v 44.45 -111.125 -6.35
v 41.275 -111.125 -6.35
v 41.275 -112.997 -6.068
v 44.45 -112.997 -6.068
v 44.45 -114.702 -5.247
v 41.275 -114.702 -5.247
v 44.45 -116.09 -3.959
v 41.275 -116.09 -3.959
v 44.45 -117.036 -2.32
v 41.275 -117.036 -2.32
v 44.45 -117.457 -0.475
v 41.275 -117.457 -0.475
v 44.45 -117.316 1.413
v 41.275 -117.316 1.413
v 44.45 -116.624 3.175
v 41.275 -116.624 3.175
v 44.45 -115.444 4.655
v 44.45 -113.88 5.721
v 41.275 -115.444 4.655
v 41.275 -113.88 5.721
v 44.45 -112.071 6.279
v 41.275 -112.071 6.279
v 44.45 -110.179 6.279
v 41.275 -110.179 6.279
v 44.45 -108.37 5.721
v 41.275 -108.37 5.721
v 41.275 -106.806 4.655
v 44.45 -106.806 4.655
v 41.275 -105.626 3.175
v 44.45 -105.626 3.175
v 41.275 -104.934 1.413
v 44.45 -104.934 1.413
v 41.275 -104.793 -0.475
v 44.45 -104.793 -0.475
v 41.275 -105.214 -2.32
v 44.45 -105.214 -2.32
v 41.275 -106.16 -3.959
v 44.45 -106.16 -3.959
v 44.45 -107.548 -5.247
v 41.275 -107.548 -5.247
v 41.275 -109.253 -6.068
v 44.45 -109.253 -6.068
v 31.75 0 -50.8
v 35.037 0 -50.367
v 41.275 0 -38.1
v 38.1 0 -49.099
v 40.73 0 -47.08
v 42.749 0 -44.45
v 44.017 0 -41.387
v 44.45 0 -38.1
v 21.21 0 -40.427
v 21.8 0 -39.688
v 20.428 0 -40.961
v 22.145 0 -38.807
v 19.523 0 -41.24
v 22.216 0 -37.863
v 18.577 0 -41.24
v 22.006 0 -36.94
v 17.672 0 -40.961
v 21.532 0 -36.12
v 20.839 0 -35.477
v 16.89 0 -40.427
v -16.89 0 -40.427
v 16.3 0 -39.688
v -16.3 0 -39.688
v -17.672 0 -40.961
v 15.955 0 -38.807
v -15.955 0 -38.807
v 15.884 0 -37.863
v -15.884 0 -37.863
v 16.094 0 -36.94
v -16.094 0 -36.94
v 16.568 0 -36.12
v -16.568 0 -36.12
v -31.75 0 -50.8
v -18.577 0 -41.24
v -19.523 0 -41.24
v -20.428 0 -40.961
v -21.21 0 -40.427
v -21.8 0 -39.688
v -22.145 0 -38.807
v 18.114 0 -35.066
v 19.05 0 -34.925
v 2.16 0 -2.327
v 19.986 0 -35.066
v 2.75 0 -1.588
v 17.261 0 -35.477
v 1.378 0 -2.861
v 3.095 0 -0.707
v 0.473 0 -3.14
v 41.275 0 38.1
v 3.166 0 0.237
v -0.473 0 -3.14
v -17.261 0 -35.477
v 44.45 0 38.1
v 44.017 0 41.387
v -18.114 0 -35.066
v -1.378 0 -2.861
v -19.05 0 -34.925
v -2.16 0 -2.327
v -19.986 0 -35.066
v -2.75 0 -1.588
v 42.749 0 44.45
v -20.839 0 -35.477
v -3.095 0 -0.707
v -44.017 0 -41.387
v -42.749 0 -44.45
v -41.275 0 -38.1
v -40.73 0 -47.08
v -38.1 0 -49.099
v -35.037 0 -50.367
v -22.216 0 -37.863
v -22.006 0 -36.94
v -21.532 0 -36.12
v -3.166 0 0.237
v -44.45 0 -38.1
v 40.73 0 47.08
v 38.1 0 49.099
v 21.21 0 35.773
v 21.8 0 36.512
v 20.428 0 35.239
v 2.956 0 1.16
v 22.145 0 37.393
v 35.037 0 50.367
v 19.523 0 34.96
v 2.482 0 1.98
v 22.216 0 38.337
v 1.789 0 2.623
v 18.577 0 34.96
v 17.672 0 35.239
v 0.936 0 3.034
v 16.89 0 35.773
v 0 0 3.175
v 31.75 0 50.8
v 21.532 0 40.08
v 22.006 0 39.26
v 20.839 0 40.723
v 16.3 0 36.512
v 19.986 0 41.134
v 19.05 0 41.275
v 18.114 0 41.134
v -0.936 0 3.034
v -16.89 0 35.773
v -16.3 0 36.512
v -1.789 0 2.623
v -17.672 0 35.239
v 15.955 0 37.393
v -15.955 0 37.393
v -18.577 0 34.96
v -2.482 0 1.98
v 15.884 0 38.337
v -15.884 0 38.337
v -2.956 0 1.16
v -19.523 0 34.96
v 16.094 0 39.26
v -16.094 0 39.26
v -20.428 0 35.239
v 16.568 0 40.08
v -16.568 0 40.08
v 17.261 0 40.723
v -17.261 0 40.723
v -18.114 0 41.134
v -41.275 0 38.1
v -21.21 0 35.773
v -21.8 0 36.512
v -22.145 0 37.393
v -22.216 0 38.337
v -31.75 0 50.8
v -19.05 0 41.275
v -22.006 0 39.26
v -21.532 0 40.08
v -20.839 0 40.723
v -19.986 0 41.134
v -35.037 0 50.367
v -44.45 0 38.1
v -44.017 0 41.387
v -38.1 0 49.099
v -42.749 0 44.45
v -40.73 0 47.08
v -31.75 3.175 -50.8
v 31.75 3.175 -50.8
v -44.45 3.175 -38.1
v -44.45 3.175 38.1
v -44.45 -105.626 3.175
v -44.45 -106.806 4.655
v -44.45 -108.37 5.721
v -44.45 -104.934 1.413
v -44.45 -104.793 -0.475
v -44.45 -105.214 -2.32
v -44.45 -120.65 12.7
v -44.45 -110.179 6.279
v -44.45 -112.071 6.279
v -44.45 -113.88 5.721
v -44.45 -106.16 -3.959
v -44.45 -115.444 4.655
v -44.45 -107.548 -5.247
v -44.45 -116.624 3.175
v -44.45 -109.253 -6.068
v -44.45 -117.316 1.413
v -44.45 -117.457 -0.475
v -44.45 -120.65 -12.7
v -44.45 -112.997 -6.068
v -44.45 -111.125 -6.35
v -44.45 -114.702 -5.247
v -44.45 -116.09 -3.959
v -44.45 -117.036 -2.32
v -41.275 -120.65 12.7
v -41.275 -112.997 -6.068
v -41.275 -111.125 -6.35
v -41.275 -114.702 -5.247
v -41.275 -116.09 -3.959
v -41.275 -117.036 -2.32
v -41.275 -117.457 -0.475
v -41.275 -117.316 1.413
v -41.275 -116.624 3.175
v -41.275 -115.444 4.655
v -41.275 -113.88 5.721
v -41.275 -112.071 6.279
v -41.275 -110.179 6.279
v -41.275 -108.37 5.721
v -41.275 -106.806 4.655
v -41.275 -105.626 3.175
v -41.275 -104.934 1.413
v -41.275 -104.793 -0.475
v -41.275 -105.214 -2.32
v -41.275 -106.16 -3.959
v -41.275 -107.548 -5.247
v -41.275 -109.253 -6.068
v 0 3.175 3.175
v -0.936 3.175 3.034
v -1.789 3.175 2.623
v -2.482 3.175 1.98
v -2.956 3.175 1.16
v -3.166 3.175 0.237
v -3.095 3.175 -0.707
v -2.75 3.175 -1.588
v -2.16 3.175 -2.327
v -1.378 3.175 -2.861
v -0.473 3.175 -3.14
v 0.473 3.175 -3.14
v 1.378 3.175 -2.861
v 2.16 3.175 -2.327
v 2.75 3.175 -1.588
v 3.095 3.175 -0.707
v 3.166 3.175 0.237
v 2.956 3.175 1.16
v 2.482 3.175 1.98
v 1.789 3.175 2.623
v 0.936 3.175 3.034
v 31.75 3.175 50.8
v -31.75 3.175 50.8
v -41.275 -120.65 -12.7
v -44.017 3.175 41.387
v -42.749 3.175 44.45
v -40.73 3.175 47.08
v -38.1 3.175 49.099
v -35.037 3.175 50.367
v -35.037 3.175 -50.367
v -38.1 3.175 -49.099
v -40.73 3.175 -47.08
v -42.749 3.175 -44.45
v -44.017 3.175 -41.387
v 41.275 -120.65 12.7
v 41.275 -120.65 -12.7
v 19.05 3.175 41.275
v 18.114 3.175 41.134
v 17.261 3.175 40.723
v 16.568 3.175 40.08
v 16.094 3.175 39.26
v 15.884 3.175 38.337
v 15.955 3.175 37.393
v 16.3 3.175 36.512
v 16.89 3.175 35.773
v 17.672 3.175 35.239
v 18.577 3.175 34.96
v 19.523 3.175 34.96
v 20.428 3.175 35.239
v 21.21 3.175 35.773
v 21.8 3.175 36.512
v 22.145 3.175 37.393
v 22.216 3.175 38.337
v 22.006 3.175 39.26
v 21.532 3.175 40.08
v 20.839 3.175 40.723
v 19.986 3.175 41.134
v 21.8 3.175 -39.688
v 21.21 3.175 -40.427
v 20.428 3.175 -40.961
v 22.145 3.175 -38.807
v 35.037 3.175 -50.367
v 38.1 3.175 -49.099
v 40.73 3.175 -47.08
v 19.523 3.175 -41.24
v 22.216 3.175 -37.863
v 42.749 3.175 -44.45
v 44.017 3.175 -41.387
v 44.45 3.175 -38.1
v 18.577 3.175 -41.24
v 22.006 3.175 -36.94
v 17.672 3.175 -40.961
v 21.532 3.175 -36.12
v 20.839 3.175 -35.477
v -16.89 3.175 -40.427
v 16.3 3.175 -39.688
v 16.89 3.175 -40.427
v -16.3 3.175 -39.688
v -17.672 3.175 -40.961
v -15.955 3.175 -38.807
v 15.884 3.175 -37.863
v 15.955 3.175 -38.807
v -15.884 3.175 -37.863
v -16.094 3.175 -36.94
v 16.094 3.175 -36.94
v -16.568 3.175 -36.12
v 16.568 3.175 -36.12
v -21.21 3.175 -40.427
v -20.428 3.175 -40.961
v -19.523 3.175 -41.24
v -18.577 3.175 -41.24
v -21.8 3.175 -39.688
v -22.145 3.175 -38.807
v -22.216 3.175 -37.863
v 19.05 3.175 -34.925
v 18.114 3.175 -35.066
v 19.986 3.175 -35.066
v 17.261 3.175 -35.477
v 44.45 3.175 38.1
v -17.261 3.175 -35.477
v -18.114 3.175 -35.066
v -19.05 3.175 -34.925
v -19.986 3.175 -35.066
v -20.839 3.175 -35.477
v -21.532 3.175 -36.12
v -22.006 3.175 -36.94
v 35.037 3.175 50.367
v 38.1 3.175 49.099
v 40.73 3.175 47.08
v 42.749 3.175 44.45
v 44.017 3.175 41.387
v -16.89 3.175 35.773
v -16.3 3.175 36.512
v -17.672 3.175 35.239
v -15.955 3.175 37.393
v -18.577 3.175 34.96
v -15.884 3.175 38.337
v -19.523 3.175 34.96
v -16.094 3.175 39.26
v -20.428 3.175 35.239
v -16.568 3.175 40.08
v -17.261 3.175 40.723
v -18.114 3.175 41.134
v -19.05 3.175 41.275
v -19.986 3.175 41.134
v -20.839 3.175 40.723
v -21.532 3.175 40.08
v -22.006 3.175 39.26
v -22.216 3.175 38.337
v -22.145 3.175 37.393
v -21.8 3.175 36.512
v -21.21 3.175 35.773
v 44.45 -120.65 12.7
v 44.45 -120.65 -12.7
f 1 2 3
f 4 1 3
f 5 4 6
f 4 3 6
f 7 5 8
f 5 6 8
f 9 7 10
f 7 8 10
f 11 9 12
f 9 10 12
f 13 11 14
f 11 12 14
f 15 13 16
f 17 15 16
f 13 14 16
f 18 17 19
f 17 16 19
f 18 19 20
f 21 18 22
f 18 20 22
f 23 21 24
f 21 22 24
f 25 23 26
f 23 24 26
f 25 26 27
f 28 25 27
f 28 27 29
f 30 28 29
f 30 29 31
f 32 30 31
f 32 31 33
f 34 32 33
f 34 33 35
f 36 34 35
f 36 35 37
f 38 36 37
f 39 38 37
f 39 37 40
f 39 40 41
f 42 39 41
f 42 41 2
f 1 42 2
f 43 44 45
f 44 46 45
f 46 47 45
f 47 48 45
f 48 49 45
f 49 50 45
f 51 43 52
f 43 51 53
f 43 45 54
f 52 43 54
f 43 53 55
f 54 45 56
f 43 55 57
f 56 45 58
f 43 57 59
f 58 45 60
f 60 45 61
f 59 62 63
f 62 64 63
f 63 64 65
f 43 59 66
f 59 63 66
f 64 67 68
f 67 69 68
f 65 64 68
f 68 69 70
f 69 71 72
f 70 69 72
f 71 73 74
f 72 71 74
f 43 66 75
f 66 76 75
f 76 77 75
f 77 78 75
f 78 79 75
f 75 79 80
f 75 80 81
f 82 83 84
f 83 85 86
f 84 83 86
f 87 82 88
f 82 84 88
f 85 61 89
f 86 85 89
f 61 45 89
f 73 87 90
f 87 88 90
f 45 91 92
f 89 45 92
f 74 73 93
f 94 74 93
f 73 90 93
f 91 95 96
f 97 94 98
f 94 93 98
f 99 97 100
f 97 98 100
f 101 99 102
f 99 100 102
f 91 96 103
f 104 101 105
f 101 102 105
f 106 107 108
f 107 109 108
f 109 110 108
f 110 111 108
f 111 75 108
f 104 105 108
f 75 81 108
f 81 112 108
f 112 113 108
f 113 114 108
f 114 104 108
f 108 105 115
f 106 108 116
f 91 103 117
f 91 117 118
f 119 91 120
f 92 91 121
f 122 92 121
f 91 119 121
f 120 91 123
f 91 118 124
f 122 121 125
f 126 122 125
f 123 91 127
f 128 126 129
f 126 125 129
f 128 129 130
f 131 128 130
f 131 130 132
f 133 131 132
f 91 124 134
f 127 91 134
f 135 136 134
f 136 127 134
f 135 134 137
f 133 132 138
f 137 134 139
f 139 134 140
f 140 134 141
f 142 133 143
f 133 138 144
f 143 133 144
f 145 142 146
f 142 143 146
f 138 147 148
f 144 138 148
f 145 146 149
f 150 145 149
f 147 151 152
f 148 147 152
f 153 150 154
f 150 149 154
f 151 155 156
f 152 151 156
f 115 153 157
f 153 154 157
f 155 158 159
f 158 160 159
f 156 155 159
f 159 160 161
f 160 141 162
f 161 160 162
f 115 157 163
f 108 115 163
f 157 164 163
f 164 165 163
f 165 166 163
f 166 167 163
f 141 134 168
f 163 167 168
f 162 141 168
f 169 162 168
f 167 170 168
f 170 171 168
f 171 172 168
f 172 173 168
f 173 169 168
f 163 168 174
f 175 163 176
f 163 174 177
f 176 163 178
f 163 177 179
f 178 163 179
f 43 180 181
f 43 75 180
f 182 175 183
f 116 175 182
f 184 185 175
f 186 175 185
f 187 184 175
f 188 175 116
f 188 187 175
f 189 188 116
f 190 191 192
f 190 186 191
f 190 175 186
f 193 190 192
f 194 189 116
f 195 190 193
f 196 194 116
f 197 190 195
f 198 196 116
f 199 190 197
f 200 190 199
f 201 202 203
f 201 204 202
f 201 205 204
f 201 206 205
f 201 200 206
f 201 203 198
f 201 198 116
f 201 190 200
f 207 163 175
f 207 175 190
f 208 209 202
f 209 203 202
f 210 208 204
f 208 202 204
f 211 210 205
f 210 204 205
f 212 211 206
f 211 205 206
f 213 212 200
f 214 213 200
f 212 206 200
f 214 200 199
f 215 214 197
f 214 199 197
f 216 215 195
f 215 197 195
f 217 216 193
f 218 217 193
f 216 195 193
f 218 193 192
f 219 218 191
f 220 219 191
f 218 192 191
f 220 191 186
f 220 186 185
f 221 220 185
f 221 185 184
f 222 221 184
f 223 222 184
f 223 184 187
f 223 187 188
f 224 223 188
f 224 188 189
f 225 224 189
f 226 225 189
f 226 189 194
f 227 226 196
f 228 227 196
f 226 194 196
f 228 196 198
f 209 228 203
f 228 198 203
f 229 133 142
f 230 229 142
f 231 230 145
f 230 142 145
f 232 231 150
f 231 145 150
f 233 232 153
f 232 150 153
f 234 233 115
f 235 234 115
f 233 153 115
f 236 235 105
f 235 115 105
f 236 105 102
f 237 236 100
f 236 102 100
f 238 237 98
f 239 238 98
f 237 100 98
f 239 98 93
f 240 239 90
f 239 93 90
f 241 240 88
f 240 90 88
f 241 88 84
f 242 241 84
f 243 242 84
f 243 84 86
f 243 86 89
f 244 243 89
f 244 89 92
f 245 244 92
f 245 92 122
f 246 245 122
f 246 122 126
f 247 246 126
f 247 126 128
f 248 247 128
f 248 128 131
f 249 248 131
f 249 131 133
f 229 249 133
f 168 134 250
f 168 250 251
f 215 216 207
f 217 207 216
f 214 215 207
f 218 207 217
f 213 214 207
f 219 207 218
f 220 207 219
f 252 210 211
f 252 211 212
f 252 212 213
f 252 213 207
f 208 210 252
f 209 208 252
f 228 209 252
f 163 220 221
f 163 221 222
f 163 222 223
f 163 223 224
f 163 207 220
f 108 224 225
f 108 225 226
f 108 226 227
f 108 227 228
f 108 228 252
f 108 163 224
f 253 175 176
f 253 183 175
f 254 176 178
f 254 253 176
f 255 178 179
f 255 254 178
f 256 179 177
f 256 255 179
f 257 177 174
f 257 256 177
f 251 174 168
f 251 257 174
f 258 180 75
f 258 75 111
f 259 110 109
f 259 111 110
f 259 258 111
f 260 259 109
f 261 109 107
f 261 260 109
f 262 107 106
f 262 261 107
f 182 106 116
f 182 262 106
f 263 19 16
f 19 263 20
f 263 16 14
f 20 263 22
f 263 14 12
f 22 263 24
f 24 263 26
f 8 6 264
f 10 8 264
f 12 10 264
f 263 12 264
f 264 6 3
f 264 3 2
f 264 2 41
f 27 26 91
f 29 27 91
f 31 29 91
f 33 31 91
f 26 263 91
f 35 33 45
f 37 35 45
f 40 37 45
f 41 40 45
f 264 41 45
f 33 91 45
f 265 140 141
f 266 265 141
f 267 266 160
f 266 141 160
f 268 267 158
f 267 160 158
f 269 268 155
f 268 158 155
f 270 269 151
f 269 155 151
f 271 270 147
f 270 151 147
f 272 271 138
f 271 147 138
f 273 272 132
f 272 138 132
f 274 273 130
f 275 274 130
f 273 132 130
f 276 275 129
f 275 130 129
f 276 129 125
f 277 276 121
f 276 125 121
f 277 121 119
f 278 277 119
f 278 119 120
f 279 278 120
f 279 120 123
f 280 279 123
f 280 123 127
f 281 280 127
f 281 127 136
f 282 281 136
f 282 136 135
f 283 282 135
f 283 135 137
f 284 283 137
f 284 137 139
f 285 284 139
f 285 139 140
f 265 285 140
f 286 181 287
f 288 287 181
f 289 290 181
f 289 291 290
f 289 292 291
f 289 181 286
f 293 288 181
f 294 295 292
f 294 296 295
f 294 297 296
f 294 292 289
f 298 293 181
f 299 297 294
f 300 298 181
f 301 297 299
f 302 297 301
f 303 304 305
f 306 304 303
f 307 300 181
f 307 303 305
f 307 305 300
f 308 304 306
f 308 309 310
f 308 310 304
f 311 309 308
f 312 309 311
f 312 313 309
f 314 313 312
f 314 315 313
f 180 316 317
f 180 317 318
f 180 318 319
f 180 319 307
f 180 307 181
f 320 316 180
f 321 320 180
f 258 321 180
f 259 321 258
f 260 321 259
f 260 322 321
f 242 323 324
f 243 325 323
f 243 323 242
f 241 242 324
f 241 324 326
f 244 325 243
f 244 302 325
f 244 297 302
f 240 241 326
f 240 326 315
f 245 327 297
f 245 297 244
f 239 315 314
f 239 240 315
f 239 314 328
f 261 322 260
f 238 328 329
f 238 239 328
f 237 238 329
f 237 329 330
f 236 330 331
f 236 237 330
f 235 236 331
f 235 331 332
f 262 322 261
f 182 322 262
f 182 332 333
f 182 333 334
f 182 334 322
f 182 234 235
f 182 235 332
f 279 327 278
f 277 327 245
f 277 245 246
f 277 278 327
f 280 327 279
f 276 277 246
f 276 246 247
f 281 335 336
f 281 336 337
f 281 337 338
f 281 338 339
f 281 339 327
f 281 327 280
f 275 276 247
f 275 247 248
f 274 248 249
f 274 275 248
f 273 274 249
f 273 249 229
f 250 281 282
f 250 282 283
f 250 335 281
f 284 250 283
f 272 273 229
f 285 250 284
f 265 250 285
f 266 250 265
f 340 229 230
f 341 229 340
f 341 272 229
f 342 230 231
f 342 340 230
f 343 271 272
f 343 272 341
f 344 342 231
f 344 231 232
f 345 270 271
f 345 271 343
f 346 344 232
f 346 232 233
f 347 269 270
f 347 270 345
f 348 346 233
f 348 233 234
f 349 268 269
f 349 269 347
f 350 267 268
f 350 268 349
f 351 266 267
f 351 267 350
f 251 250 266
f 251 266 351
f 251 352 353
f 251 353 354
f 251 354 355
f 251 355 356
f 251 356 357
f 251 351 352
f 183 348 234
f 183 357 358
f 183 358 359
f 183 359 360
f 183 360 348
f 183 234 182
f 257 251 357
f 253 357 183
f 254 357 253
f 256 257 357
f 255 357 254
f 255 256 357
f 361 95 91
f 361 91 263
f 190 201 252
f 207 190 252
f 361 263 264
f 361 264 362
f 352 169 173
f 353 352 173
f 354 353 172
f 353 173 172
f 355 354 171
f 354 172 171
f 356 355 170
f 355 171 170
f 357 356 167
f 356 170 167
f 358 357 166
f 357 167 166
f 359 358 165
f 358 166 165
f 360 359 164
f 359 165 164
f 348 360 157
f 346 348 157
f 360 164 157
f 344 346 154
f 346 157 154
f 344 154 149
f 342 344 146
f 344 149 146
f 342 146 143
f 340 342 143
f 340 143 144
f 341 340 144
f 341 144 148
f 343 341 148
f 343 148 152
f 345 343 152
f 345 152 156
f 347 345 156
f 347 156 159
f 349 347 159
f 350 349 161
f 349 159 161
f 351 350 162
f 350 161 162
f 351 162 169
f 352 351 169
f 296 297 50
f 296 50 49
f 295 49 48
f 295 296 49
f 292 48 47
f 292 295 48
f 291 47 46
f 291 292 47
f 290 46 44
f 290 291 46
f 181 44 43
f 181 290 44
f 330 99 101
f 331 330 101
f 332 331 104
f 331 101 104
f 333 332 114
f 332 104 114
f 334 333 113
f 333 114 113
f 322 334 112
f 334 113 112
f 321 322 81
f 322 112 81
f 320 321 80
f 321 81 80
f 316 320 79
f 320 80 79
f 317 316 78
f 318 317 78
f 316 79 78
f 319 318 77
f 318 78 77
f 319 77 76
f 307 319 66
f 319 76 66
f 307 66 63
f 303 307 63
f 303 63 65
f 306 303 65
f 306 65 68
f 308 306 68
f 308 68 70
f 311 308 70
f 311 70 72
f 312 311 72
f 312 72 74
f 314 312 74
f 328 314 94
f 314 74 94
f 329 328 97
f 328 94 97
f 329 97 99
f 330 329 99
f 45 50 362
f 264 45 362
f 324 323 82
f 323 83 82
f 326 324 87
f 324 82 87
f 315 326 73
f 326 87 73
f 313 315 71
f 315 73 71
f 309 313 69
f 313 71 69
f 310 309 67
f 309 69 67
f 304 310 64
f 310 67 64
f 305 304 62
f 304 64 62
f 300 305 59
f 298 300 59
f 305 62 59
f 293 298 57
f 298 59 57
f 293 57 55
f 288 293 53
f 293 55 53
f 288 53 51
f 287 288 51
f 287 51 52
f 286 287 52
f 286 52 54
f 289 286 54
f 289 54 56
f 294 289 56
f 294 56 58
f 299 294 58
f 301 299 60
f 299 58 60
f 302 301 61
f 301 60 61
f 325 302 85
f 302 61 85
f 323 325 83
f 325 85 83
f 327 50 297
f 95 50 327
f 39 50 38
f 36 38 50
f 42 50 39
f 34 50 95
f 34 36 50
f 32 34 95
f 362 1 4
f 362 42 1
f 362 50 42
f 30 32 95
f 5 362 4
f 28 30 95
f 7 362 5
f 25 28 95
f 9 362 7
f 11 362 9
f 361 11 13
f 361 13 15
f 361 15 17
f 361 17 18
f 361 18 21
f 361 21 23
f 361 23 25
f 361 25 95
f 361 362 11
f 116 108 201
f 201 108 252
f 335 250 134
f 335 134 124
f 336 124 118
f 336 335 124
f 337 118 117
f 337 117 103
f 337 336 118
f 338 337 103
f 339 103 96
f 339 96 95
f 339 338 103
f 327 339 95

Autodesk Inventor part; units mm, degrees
ref_plane "YZ Plane" through (0, 0, 0) normal (1, 0, 0) x (0, 1, 0)
ref_plane "XZ Plane" through (0, 0, 0) normal (0, 1, 0) x (-1, 0, 0)
ref_plane "XY Plane" through (0, 0, 0) normal (0, 0, 1) x (1, 0, 0)
sketch "Sketch2" plane through (0, 0, 0) normal (0, 1, 0) x (-1, 0, 0)
  line L0 (-44.45, 50.8) -> (44.45, 50.8)
  line L1 (44.45, 50.8) -> (44.45, -50.8)
  line L2 (44.45, -50.8) -> (-44.45, -50.8)
  line L3 (-44.45, -50.8) -> (-44.45, 50.8)
  point P0 (0, 0)
  dimension "d0" = 44.45
  dimension "d1" = 44.45
  dimension "d2" = 50.8
  dimension "d3" = 50.8
extrude "Extrusion1" add sketch "Sketch2" along normal blind 3.175
fillet "Fillet1" radius 12.7 4 edges at (44.45, 1.5875, 50.8) (-44.45, 1.5875, 50.8) (44.45, 1.5875, -50.8) (-44.45, 1.5875, -50.8)
sketch "Sketch3" plane through (0, 3.175, 0) normal (0, 1, 0) x (1, 0, 0)
  line L0 (-19.05, 38.1) -> (19.05, 38.1) construction
  line L1 (19.05, 38.1) -> (19.05, -38.1) construction
  line L2 (19.05, -38.1) -> (-19.05, -38.1) construction
  line L3 (-19.05, -38.1) -> (-19.05, 38.1) construction
  point P0 (0, 0)
  point P1 (0, 0)
  point P2 (-19.05, 0)
  point P3 (0, 38.1)
  dimension "d36" = 38.1
  dimension "d37" = 76.2
hole "Hole1" at (-19.05, 3.175, -38.1) at (19.05, 3.175, -38.1) at (19.05, 3.175, 38.1) at (-19.05, 3.175, 38.1) at (0, 3.175, 0) direction (0, -1, 0) diameter 6.35 end through all
sketch "Sketch4" plane through (0, 0, 0) normal (0, -1, 0) x (1, 0, 0)
  circle A0 centre (-19.05, 38.1) radius 3.175 projected
  line L0 (44.45, -38.1) -> (44.45, 38.1) projected
  line L1 (-44.45, 38.1) -> (-44.45, -38.1) projected
  line L2 (44.45, 38.1) -> (41.275, 38.1)
  line L3 (41.275, 38.1) -> (41.275, -38.1)
  line L4 (41.275, -38.1) -> (44.45, -38.1)
  line L5 (44.45, -38.1) -> (44.45, 38.1)
  line L6 (-44.45, 38.1) -> (-41.275, 38.1)
  line L7 (-41.275, 38.1) -> (-41.275, -38.1)
  line L8 (-41.275, -38.1) -> (-44.45, -38.1)
  line L9 (-44.45, -38.1) -> (-44.45, 38.1)
  dimension "d18" = 3.175
  dimension "d19" = 3.175
  dimension "d20" = 76.2
  dimension "d21" = 76.2
extrude "Extrusion2" add sketch "Sketch4" along normal blind 120.65 contours L4 L3 L2 L0 | L6 L7 L8 L1
sketch "Sketch5" plane through (44.45, 3.175, 38.1) normal (1, 0, 0) x (0, 0, -1)
  line L0 (0, -3.175) -> (0, -123.825) projected
  line L1 (76.2, -3.175) -> (76.2, -123.825) projected
  line L2 (0, -3.175) -> (25.4, -123.825)
  line L3 (76.2, -3.175) -> (50.8, -123.825)
  line L4 (0, -3.175) -> (0, -123.825)
  line L5 (25.4, -123.825) -> (0, -123.825)
  line L6 (50.8, -123.825) -> (76.2, -123.825)
  line L7 (76.2, -123.825) -> (76.2, -3.175)
  point P0 (38.1, -3.175)
extrude "Extrusion3" cut sketch "Sketch5" against normal blind 127
sketch "Sketch6" plane through (44.45, 3.175, 38.1) normal (1, 0, 0) x (0, 0, -1)
  line L0 (25.4, -123.825) -> (50.8, -123.825) projected
  point P0 (38.1, -3.175)
  point P1 (38.1, -114.3)
  dimension "d28" = 9.525
hole "Hole2" at (44.45, -111.125, 0) direction (-1, 0, 0) diameter 12.7 end through all
equation "\"d1\" = d0"
equation "\"d3\" = d2"
equation "\"d4\" = metalThickness"
equation "\"d18\" = metalThickness"
equation "\"d19\" = metalThickness"
equation "\"d21\" = d20"
equation "\"metalThickness\" = 3.175"
properties part number "Caster2"
